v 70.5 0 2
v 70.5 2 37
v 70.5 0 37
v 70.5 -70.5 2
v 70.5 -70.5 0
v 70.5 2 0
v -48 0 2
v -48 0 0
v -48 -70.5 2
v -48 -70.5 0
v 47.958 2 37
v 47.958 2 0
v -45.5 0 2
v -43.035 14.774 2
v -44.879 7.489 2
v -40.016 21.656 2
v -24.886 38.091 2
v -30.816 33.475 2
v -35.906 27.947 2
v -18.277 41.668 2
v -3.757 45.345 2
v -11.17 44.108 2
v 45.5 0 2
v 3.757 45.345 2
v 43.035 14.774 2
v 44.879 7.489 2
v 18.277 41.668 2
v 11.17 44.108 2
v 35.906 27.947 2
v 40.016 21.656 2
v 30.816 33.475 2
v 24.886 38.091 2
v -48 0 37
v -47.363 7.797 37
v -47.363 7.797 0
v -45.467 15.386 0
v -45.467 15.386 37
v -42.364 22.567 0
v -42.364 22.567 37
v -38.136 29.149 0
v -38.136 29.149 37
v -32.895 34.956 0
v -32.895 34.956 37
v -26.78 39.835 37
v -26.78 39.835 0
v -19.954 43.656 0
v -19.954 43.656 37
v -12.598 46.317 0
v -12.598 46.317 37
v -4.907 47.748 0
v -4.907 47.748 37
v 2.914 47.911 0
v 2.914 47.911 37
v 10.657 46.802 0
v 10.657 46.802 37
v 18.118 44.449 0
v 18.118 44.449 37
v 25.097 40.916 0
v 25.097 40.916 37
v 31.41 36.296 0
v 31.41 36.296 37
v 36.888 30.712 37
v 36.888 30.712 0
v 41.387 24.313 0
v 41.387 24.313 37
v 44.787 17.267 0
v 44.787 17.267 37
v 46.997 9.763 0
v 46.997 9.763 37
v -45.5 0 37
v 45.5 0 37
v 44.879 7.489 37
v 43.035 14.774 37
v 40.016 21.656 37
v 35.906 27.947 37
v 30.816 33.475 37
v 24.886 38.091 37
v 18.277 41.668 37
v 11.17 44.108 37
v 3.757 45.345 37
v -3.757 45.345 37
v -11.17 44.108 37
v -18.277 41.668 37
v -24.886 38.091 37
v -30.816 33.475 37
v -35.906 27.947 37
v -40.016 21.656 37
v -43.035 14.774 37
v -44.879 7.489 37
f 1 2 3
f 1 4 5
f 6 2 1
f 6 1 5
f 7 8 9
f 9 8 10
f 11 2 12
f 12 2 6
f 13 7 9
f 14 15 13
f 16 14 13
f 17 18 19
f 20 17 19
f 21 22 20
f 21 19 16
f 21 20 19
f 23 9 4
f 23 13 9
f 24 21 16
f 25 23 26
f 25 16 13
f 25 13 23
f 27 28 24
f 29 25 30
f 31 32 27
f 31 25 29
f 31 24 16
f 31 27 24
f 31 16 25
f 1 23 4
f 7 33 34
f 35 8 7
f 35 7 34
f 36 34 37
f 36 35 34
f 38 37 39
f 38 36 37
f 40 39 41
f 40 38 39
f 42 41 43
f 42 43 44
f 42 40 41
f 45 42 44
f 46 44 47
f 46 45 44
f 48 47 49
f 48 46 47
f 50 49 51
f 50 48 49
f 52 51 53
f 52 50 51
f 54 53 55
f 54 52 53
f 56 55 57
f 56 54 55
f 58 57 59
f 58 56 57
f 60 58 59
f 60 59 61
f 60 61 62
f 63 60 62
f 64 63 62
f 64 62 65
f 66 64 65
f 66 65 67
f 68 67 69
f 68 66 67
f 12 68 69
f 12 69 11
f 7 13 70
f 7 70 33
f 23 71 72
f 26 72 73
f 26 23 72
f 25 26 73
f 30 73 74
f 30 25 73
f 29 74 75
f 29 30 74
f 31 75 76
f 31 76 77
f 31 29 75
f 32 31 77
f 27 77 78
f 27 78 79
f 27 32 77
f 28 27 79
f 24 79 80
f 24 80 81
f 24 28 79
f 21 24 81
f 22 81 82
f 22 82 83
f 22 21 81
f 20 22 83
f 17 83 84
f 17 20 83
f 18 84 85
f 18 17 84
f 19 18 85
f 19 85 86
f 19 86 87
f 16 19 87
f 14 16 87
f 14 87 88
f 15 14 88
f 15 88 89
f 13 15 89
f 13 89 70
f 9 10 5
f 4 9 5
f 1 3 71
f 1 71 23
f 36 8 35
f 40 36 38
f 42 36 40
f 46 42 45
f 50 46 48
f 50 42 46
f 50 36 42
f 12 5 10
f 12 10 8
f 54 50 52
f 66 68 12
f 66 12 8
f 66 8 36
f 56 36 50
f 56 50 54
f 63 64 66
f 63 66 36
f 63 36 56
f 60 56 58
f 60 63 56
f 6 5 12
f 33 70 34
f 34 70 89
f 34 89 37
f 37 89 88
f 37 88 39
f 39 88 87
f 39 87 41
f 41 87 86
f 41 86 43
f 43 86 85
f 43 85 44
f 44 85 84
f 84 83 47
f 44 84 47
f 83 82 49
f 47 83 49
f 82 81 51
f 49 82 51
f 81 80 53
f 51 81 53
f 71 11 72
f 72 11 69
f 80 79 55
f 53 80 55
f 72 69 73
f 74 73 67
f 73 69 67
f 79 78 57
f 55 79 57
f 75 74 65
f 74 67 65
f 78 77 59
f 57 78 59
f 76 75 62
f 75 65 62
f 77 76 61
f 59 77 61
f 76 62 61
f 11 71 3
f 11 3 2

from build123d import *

# Parameters (mm, degrees)
BOSS_EXTRU_1_DEPTH      = 2
BOSS_EXTRU_2_DEPTH      = 35
BOSS_EXTRU_3_REACH      = 144.764
BOSS_EXTRU_3_END_RADIUS = 48
ESQUISSE4_W             = 37
ESQUISSE4_H             = 2


with BuildPart() as part:
    # Esquisse1 → Boss.-Extru.1 (new body)
    with BuildSketch(Plane.XY):
        with BuildLine():
            Line((-48, 0), (-48, -68))
            Line((-48, -68), (-48, -70.5))
            Line((-48, -70.5), (70.5, -70.5))
            Line((70.5, -70.5), (70.5, -68))
            Line((70.5, -68), (70.5, 0))
            Line((70.5, 0), (68, 0))
            Line((68, 0), (48, 0))
            ThreePointArc((48, 0), (0, 48), (-48, 0))
        make_face()
    extrude(amount=BOSS_EXTRU_1_DEPTH)

    # Esquisse3 → Boss.-Extru.2 (add)
    with BuildSketch(Plane.XY.offset(2)):
        with BuildLine():
            Line((-45.5, 0), (-48, 0))
            ThreePointArc((-48, 0), (0, 48), (48, 0))
            Line((48, 0), (45.5, 0))
            ThreePointArc((45.5, 0), (0, 45.5), (-45.5, 0))
        make_face()
    extrude(amount=BOSS_EXTRU_2_DEPTH)

    # Boss.-Extru.3: up to this cylinder (the profile starts outside it)
    boss_extru_3_end = Plane(origin=(0, 0, 18.5), z_dir=(0, 0, -1)) * Cylinder(BOSS_EXTRU_3_END_RADIUS, 386.528, mode=Mode.PRIVATE)
    # Esquisse4 → Boss.-Extru.3 (add, up to the surface)
    with BuildSketch(Plane(origin=(70.5, 0, 0), x_dir=(0, 0, -1), z_dir=(1, 0, 0)), mode=Mode.PRIVATE) as boss_extru_3_sk1:
        with Locations((-18.5, 1)):
            Rectangle(ESQUISSE4_W, ESQUISSE4_H)
    boss_extru_3_tool1 = extrude(boss_extru_3_sk1.sketch, amount=-BOSS_EXTRU_3_REACH, mode=Mode.PRIVATE) - boss_extru_3_end
    add(boss_extru_3_tool1.solids().sort_by_distance((70.5, 1, 18.5))[0])


solid = part.part
